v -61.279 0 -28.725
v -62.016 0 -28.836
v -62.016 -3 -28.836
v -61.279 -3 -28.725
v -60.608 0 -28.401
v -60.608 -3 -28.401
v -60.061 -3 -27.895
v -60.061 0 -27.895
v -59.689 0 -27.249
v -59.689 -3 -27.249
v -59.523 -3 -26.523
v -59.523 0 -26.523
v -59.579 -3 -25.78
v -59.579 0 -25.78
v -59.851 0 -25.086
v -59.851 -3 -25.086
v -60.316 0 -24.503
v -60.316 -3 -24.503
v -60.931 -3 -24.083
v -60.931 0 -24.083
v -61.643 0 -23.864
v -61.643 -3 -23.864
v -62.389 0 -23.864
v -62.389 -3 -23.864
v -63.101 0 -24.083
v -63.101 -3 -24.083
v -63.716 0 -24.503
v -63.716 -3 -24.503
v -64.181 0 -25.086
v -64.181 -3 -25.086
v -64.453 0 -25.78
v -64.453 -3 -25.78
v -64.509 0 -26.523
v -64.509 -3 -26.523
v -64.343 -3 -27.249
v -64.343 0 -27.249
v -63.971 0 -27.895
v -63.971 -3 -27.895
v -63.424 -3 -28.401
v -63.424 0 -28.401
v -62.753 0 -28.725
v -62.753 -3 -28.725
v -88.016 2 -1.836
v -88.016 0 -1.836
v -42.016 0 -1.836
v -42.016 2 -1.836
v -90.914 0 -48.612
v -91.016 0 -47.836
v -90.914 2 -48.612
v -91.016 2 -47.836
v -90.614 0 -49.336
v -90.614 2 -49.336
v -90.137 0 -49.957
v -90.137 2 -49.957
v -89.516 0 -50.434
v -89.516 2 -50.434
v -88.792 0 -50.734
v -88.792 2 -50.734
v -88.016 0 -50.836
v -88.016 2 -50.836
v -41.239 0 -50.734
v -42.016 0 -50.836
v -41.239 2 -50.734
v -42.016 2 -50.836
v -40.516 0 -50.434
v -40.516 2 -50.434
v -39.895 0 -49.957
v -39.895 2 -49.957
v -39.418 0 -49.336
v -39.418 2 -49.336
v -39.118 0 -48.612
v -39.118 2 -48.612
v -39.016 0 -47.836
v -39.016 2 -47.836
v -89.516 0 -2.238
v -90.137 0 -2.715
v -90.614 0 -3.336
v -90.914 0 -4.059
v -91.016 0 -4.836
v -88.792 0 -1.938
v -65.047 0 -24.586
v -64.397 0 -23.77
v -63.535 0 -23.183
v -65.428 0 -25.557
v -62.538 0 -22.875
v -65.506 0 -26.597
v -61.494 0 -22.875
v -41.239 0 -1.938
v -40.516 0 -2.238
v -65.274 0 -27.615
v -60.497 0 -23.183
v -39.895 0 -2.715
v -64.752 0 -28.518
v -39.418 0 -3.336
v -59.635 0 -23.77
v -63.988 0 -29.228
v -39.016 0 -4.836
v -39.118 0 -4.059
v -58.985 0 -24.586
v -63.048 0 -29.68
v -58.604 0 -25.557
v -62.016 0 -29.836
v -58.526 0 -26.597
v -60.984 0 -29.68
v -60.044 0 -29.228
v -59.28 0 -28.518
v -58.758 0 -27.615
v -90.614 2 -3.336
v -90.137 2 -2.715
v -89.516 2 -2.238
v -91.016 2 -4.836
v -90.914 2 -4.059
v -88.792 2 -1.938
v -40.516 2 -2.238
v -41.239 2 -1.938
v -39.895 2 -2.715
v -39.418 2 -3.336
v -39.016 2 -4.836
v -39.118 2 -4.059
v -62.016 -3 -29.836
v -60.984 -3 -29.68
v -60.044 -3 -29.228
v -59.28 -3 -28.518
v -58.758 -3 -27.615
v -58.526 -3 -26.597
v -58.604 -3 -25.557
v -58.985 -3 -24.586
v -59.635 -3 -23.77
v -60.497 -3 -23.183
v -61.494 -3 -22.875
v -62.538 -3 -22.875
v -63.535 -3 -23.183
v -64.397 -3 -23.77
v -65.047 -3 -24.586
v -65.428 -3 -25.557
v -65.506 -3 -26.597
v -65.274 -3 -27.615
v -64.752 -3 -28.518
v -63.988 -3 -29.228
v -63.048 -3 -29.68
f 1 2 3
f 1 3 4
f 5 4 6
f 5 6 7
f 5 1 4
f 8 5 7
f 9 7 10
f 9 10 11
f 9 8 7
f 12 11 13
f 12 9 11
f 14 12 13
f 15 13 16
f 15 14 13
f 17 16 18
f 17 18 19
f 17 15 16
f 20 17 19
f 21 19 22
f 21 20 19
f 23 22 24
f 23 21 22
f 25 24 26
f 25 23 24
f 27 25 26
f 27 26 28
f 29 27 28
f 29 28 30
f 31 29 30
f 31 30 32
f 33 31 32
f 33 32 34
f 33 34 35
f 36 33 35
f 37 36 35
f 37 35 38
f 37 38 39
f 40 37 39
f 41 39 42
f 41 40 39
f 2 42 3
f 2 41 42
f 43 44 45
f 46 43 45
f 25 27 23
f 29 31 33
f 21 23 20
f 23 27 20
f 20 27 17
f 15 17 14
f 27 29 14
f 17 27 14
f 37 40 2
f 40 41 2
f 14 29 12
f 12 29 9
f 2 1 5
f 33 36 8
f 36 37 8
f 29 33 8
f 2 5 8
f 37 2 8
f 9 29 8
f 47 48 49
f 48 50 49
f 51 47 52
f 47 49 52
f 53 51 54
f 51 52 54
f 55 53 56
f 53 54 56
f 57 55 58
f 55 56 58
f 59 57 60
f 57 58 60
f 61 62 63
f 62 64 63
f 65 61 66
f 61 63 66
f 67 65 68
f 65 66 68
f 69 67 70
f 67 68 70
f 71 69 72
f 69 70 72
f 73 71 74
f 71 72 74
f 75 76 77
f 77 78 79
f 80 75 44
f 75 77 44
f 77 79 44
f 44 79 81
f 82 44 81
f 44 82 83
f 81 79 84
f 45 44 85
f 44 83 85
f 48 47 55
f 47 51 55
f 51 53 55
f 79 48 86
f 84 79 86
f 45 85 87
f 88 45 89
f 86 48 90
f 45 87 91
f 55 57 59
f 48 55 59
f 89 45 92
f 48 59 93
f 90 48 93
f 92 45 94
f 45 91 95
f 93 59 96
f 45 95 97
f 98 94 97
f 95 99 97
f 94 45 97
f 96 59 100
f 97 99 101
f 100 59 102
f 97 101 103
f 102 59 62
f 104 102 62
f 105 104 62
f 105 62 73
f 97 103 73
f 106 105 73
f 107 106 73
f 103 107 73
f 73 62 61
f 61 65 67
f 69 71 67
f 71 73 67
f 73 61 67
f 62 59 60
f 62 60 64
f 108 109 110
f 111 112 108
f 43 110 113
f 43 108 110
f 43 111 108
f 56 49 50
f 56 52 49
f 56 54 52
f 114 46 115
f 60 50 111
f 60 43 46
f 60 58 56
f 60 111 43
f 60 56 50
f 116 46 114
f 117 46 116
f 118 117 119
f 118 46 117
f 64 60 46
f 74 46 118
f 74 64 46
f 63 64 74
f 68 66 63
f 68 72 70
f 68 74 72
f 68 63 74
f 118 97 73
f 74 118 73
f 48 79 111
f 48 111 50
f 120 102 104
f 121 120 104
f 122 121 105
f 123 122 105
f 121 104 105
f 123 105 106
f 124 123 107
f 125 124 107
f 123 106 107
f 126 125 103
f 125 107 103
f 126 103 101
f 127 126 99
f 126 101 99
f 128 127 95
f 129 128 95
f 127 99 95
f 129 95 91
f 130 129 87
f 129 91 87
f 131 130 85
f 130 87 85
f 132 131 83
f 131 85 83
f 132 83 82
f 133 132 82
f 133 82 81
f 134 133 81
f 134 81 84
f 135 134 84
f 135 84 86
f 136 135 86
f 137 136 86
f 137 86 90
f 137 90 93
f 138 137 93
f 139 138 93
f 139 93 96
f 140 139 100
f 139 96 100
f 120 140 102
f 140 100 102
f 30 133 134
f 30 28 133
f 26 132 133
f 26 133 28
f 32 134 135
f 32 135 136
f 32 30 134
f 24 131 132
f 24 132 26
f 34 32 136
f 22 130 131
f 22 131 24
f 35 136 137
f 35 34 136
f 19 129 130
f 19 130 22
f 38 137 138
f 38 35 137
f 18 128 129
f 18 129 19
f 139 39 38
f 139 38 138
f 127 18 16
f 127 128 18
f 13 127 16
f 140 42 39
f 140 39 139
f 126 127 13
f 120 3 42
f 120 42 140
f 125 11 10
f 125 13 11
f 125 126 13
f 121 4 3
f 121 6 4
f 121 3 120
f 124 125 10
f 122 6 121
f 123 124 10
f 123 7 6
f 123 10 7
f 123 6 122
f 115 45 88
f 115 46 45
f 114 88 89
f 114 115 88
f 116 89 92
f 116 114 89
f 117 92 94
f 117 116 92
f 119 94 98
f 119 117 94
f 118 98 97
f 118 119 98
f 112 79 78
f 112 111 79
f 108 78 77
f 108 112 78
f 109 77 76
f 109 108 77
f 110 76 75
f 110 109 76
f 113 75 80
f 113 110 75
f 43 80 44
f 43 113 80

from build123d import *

# Parameters (mm, degrees)
SKETCH3_W           = 52
SKETCH3_H           = 49
BOSS_EXTRUDE3_DEPTH = 2
SKETCH5_R           = 3.5
SKETCH5_R_2         = 2.5
BOSS_EXTRUDE5_DEPTH = 3
FILLET1_R           = 3


with BuildPart() as part:
    # Sketch3 → Boss-Extrude3 (new body)
    with BuildSketch(Plane(origin=(0, 0, 0), x_dir=(1, 0, 0), z_dir=(0, 1, 0))):
        with Locations((-65.015948434, 26.335900173)):
            Rectangle(SKETCH3_W, SKETCH3_H)
    extrude(amount=BOSS_EXTRUDE3_DEPTH)

    # Sketch5 → Boss-Extrude5 (add)
    with BuildSketch(Plane.XZ):
        with Locations(Location((-62.015948434, -26.335900173, 0), (0, 0, 270))):
            Circle(SKETCH5_R)
        with Locations(Location((-62.015948434, -26.335900173, 0), (0, 0, 270))):
            Circle(SKETCH5_R_2, mode=Mode.SUBTRACT)
    extrude(amount=BOSS_EXTRUDE5_DEPTH)

    # Fillet1
    fillet1_edges = [part.edges().sort_by_distance(p)[0] for p in [
        (-39.015948434, 1, -50.835900173),
        (-39.015948434, 1, -1.835900173),
        (-91.015948434, 1, -1.835900173),
        (-91.015948434, 1, -50.835900173),
    ]]
    fillet(fillet1_edges, radius=FILLET1_R)


solid = part.part
